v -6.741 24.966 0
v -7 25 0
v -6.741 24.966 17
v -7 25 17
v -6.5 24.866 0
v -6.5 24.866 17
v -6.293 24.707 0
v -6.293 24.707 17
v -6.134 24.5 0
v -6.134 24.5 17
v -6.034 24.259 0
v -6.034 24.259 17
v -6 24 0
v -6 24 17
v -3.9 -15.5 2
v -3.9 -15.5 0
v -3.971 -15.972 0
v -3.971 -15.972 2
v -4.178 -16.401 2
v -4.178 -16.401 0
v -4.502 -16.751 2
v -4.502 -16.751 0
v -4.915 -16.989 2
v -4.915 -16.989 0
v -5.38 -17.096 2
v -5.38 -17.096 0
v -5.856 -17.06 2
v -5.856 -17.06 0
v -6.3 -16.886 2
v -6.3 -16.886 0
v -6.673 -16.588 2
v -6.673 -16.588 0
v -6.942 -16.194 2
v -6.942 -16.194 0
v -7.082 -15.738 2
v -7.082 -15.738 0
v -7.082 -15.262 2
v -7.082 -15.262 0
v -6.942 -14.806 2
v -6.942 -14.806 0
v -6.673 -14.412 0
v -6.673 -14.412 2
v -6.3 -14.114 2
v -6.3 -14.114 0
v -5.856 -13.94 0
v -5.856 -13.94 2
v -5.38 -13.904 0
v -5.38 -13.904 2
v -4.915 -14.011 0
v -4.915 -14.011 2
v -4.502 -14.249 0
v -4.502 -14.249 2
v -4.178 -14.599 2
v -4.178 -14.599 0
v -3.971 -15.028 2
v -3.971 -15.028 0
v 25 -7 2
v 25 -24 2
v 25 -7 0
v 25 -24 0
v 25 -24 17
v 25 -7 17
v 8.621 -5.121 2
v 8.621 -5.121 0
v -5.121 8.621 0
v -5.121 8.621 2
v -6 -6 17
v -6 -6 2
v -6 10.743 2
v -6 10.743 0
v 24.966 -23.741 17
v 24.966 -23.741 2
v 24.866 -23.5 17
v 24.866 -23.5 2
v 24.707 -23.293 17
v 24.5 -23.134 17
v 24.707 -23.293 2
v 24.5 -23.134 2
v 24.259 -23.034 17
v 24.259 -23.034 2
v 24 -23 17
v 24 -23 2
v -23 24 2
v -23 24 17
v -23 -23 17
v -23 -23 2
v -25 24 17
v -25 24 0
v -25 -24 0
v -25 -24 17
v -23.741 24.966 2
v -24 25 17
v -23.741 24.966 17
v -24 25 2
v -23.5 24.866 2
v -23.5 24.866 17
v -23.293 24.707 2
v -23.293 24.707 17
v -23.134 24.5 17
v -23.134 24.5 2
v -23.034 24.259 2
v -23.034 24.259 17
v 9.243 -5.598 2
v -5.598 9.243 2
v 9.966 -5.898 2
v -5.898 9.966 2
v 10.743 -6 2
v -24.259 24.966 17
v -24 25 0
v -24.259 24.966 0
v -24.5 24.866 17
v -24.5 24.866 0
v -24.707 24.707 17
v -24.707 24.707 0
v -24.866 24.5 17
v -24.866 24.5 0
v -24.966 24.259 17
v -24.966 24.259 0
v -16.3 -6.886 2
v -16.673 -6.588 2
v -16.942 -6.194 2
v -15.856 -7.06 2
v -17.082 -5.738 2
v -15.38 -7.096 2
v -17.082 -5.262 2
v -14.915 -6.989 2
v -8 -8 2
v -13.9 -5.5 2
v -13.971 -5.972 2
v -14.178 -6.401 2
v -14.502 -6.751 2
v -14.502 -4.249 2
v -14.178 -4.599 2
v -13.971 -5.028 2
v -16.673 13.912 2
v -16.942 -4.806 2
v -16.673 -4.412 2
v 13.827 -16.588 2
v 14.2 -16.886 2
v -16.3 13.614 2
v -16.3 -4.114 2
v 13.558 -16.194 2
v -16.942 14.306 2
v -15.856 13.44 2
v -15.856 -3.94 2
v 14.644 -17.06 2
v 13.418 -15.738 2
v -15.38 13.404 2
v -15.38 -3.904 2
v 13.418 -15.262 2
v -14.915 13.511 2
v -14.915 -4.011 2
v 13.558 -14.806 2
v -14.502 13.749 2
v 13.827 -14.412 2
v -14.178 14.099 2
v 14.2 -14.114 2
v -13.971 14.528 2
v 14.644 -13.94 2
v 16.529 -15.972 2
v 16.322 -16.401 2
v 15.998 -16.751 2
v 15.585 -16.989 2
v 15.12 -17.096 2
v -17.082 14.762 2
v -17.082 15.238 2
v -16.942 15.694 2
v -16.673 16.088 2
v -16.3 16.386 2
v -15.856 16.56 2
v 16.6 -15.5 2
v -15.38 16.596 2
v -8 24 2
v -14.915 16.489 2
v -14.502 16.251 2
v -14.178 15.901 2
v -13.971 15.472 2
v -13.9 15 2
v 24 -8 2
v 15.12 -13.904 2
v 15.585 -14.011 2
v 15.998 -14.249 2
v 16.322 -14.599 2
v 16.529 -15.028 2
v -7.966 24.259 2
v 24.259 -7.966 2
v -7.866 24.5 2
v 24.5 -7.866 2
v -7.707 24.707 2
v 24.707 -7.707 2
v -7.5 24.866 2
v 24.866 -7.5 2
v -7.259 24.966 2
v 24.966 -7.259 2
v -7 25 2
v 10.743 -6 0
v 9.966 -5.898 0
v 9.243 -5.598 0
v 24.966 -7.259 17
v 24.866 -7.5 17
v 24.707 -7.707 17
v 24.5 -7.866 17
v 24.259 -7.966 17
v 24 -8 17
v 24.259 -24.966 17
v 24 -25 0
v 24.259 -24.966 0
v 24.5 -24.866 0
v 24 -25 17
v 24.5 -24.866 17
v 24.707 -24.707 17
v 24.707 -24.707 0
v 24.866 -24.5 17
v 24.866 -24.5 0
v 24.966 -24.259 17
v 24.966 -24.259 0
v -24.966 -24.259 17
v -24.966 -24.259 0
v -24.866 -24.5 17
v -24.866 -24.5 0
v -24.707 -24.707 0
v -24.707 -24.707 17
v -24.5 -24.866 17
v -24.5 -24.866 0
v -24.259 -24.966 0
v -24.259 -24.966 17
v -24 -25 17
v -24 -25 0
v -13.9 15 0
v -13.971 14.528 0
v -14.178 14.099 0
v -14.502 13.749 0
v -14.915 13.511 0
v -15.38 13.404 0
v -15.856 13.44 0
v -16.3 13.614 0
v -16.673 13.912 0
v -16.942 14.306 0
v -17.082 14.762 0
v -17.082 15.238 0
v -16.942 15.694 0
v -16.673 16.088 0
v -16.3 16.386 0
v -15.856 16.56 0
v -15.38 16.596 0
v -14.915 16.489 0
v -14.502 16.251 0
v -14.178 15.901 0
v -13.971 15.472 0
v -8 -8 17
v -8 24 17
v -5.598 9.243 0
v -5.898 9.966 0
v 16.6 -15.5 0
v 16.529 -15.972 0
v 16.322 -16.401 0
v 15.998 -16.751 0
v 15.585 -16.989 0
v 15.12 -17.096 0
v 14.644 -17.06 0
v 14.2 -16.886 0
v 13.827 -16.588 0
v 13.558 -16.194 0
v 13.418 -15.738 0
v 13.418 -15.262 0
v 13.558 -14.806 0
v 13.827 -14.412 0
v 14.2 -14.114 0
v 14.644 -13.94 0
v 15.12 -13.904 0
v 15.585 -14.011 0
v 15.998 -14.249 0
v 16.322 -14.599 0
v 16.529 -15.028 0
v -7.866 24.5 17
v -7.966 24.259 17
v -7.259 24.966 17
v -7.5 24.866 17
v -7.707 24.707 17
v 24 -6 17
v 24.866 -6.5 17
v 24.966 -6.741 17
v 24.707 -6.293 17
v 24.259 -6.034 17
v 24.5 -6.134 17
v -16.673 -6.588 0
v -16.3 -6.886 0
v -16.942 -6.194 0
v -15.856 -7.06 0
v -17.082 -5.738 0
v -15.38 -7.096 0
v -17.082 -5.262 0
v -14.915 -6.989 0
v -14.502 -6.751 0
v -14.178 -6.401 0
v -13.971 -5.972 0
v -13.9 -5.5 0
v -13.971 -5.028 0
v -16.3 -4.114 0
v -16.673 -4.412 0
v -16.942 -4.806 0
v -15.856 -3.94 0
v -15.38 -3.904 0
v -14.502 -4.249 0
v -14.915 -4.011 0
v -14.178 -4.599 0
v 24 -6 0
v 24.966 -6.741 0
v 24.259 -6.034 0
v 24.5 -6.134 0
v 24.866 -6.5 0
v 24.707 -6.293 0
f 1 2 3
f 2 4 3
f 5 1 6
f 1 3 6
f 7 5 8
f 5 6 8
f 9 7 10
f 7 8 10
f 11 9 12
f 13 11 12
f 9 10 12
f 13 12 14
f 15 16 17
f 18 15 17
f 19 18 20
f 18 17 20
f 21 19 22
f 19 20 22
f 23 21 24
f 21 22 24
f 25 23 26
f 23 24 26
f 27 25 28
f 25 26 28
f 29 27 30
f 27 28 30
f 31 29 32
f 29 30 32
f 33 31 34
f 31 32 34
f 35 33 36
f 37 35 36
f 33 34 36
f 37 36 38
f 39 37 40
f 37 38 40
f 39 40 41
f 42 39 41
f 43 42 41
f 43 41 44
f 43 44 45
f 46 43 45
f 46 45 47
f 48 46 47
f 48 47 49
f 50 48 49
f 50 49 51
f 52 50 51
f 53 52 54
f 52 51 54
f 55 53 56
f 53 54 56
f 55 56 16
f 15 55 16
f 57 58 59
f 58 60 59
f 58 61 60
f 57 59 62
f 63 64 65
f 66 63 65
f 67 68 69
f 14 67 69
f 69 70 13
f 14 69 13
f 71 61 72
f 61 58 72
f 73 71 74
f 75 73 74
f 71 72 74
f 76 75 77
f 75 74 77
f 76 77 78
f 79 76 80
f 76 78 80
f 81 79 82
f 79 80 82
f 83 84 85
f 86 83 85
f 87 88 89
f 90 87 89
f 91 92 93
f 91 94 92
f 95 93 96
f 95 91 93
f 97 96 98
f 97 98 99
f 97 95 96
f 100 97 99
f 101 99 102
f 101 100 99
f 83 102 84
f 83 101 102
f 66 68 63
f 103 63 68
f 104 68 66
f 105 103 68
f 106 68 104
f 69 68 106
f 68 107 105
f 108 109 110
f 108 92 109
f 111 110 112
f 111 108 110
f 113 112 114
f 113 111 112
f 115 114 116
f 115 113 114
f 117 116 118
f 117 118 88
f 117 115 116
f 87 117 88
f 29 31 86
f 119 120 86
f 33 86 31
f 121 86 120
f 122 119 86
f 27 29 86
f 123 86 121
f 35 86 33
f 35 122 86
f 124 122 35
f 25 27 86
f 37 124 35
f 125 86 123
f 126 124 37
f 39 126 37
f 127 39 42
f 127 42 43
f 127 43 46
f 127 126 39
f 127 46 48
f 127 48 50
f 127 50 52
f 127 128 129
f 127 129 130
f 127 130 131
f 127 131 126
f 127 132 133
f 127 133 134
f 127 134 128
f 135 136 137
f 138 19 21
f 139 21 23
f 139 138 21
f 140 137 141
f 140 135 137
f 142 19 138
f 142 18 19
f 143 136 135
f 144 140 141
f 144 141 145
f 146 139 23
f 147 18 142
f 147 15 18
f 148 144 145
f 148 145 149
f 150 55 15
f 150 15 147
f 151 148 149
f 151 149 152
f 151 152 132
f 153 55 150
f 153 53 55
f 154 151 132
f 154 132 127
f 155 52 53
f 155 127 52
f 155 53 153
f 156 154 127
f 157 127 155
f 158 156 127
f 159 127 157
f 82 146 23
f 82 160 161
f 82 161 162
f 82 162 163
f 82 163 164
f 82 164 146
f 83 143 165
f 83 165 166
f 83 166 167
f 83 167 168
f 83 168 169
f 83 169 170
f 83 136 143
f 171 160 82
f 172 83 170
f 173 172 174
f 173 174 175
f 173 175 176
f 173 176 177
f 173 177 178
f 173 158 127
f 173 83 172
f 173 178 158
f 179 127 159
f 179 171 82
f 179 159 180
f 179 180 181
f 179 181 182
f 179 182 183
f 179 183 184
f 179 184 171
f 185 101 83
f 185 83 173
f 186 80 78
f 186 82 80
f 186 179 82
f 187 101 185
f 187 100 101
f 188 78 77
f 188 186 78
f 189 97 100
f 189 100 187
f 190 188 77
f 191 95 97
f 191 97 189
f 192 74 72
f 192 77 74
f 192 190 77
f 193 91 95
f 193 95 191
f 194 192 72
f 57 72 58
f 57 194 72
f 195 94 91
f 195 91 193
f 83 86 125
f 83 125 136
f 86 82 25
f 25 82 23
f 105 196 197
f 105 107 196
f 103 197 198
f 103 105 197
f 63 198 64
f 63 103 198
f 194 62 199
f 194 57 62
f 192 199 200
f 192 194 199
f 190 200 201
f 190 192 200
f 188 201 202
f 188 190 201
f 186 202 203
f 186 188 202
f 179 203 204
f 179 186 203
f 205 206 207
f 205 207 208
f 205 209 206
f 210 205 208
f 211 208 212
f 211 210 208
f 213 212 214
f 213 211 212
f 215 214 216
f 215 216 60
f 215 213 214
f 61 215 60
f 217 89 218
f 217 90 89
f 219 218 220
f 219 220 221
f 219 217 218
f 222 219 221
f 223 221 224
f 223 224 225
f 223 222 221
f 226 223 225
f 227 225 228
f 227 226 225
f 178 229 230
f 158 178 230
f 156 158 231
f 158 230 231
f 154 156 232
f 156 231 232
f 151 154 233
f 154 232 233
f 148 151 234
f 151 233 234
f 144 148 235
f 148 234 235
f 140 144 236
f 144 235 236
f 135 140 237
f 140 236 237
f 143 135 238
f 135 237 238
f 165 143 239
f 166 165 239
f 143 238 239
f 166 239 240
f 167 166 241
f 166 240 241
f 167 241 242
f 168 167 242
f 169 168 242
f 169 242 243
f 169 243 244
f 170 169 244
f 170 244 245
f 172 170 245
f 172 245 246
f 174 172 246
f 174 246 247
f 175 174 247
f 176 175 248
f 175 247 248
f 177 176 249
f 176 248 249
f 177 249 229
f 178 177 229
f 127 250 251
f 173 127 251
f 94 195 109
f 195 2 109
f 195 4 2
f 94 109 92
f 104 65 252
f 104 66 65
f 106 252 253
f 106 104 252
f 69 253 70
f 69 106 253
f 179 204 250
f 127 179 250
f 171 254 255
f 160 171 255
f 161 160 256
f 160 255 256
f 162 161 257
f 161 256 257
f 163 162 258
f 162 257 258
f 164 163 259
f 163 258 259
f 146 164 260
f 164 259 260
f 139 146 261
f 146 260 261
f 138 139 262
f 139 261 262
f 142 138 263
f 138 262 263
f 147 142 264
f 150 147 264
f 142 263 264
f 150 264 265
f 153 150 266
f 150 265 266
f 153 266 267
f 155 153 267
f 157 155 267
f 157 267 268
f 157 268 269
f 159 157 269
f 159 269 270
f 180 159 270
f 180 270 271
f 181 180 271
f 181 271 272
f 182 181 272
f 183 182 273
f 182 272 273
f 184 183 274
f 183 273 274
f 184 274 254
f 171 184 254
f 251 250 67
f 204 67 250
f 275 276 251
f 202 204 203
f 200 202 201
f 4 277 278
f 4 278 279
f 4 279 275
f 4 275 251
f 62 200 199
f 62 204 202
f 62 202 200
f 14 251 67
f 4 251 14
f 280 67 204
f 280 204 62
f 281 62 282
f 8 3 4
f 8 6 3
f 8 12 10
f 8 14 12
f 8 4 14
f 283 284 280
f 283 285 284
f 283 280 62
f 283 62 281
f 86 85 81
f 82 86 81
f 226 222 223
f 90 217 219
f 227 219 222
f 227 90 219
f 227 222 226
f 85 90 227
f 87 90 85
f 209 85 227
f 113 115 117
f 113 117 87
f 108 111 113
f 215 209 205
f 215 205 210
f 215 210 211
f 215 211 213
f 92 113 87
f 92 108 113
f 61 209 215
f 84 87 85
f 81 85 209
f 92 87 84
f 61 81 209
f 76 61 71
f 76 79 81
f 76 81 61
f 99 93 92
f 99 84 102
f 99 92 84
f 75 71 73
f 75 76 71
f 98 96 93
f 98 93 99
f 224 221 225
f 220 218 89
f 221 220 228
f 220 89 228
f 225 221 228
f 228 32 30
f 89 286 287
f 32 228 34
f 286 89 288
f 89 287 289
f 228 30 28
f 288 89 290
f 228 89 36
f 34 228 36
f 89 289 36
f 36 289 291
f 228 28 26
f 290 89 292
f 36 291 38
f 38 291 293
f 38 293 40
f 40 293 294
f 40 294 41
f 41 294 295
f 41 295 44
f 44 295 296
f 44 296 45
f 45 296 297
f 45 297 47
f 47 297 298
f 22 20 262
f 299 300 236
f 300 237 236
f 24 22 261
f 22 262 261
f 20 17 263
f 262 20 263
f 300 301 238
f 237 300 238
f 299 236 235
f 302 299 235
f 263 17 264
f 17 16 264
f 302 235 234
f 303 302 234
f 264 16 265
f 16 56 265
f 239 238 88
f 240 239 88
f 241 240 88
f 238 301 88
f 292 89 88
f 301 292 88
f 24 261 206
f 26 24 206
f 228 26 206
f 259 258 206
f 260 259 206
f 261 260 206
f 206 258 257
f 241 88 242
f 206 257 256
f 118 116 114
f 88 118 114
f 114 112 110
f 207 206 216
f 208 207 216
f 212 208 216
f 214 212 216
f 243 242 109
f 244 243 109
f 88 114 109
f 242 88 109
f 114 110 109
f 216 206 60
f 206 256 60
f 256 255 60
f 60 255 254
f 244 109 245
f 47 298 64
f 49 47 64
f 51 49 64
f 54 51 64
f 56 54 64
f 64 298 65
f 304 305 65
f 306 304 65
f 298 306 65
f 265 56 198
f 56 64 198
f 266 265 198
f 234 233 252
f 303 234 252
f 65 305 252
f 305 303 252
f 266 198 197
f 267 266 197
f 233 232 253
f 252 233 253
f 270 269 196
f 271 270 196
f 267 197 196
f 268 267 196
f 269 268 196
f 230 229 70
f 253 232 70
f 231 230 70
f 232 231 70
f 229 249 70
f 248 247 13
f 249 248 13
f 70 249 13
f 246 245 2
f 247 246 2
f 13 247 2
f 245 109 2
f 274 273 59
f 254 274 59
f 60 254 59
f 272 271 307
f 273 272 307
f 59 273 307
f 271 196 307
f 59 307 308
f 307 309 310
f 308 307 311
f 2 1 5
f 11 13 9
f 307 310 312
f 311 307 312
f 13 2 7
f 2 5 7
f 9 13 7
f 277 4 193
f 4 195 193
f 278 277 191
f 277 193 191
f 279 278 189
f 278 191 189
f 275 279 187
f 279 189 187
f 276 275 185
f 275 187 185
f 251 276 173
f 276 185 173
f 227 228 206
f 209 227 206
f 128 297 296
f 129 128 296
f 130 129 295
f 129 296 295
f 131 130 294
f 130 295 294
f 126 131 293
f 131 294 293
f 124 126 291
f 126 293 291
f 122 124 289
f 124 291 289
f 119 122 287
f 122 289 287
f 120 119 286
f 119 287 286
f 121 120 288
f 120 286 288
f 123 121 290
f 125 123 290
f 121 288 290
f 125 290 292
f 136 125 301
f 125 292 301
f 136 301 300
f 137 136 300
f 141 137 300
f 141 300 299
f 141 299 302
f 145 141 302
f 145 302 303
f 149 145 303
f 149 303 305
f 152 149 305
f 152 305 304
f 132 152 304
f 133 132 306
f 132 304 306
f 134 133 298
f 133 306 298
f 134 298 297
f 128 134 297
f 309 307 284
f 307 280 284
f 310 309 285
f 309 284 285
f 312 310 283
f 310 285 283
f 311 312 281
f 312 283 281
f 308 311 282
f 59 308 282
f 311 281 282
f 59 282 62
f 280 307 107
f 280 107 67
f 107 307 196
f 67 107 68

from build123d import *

# Parameters (mm, degrees)
F1_DEPTH = 17
F3_DEPTH = 15
F4_R     = 1.6
F5_DEPTH = 2
F6_R     = 0.99999
F8_DEPTH = 15
F9_R     = 3


# Not quite as in the source:
# - a fillet or chamfer is up to 0.001 mm smaller than in the source, because OpenCascade refuses the exact size


with BuildPart() as f1:
    # F0 (on Top) → F1 (new body)
    with BuildSketch(Plane.XY):
        Polygon((-6, 25), (-25, 25), (-25, -25), (25, -25), (25, -6), (9.5, -6), (-6, -6), (-6, 9.5), align=None)
        Polygon((9.5, -6), (-6, 9.5), (-6, -6), align=None)
    extrude(amount=F1_DEPTH)

    # F2 (on face) → F3 (cut)
    with BuildSketch(Plane.XY.offset(17)):
        Polygon((-8, 25), (-23, 25), (-23, -23), (25, -23), (25, -8), (-6, -8), (-8, -8), (-8, -6), align=None)
    extrude(amount=-F3_DEPTH, mode=Mode.SUBTRACT)

    # F4 (on face) → F5 (cut, through all)
    with BuildSketch(Plane(origin=(0, 0, 0), x_dir=(1, 0, 0), z_dir=(0, 0, -1))):
        with Locations((15, 15.5)):
            Circle(F4_R)
        with Locations((-5.5, 15.5)):
            Circle(F4_R)
        with Locations((-15.5, 5.5)):
            Circle(F4_R)
        with Locations((-15.5, -15)):
            Circle(F4_R)
    extrude(amount=-F5_DEPTH, mode=Mode.SUBTRACT)

    # F6 (radius 1 in the source; OpenCascade refuses exactly that, so slightly less here)
    f6_edges = [f1.edges().sort_by_distance(p)[0] for p in [
        (25, -25, 8.5),
        (25, -23, 9.5),
        (25, -8, 9.5),
        (25, -6, 8.5),
        (-25, -25, 8.5),
        (-25, 25, 8.5),
        (-8, 25, 9.5),
        (-23, 25, 9.5),
        (-6, 25, 8.5),
    ]]
    fillet(f6_edges, radius=F6_R)

    # F7 (on face) → F8 (cut)
    with BuildSketch(Plane.XY.offset(17)):
        Polygon((-6, -6), (9.5, -6), (-6, 9.5), align=None)
    extrude(amount=-F8_DEPTH, mode=Mode.SUBTRACT)

    # F9
    f9_edges = [f1.edges().sort_by_distance(p)[0] for p in [
        (-6, 9.5, 1),
        (9.5, -6, 1),
    ]]
    fillet(f9_edges, radius=F9_R)


solid = f1.part
